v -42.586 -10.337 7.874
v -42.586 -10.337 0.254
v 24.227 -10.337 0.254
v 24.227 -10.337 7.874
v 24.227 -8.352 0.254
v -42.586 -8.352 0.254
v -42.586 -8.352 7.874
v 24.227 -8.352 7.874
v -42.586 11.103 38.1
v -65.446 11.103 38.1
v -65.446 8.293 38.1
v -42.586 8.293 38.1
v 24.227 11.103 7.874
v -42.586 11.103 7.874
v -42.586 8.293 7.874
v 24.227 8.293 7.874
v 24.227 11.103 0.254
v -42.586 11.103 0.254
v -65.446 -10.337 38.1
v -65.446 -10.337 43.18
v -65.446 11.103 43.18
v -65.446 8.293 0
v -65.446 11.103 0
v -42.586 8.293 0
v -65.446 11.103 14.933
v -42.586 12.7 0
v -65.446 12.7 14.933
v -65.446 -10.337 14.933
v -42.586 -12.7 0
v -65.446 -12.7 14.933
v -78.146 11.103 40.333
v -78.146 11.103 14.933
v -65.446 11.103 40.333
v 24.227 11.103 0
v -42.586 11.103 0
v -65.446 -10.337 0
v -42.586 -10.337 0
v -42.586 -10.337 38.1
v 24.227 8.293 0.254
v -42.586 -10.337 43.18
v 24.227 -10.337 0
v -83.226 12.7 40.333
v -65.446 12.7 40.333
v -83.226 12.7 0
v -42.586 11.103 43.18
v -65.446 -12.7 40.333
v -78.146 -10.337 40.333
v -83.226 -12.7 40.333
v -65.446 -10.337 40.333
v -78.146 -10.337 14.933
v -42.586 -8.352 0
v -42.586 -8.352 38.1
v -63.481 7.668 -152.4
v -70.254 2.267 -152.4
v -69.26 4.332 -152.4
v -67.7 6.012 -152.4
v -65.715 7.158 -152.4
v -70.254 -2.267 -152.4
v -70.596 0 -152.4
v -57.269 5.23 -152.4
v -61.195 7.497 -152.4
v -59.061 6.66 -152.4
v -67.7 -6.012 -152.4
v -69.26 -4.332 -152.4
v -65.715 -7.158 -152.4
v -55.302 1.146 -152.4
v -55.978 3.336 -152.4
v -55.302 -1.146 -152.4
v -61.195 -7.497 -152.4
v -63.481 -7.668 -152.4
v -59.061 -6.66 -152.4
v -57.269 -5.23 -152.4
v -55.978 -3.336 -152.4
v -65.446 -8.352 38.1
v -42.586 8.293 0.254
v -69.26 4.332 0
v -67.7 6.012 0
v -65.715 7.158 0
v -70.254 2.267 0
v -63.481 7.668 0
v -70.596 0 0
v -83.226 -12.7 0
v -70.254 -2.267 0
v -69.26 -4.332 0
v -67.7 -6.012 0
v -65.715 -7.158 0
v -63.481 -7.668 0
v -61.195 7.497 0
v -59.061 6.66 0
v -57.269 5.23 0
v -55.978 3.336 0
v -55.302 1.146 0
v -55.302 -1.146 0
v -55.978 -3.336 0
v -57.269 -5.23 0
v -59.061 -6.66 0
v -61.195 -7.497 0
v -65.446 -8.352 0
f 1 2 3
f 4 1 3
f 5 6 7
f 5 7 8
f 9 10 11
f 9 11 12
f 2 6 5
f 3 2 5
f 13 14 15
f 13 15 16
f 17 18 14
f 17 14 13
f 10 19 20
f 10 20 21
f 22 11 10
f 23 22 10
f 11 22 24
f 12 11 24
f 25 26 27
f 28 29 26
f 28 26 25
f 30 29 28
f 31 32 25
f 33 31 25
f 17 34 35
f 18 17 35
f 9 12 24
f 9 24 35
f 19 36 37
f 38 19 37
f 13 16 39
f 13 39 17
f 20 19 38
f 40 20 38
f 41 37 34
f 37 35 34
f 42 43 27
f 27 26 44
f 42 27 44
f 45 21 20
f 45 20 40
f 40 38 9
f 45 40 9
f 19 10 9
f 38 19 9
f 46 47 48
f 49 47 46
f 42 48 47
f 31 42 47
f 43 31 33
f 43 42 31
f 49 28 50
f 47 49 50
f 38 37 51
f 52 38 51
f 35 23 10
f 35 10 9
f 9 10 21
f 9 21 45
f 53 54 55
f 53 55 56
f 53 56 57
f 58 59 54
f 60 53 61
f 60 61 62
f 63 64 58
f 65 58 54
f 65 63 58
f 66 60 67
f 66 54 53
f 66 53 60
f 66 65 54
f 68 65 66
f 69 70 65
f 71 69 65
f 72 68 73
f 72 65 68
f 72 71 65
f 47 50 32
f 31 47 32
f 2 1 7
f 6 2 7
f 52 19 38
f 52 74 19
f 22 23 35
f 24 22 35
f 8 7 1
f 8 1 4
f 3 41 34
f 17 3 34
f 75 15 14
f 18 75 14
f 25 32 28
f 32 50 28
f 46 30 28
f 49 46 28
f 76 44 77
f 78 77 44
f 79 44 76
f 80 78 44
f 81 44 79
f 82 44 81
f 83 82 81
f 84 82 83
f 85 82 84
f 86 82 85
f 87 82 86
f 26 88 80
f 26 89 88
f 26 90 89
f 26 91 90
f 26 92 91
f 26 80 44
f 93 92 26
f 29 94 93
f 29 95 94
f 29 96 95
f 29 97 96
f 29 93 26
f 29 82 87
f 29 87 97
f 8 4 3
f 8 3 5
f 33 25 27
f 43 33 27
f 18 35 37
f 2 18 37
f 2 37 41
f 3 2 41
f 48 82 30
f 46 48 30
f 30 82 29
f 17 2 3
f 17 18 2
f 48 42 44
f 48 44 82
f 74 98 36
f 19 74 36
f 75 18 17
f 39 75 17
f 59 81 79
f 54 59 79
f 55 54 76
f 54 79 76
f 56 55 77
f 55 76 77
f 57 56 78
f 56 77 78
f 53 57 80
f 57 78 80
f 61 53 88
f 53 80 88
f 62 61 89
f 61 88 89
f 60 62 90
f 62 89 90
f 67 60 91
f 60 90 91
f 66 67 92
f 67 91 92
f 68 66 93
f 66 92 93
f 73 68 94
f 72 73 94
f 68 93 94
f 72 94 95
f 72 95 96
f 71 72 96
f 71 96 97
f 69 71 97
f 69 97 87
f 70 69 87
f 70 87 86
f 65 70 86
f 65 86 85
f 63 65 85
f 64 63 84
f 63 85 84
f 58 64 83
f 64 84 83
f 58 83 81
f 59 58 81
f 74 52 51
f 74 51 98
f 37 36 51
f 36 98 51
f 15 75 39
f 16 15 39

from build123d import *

# Parameters (mm, degrees)
F1_DEPTH  = 12.7
F2_W      = 17.78
F2_H      = 14.932741411
F3_DEPTH  = 12.7
F5_DEPTH  = 25.4
F7_DEPTH  = 0.254
F6_W      = 22.8599980474
F6_H      = 2.8099045157
F8_DEPTH  = 38.1
F9_W      = 22.8599980474
F9_H      = 21.4400039986
F10_DEPTH = 5.08
F11_W     = 66.8126046658
F11_H     = 1.9855666906
F12_DEPTH = 7.62
F11_H_2   = 2.8099045157
F14_DEPTH = 152.4


with BuildPart() as f1:
    # F0 (on Front) → F1 (new body, symmetric)
    with BuildSketch(Plane.XZ):
        Polygon((-65.4459670186, 0), (-42.5859689713, 0), (-65.4459670186, 14.932741411), align=None)
    extrude(amount=F1_DEPTH, both=True)

    # F2 (on Front) → F3 (join, symmetric)
    with BuildSketch(Plane.XZ):
        with Locations((-74.3359670186, 7.4663707055)):
            Rectangle(F2_W, F2_H)
    extrude(amount=F3_DEPTH, both=True)

    # F4 (on face) → F5 (join)
    with BuildSketch(Plane.XY.offset(14.932741411)):
        Polygon((-83.2259670186, -12.7), (-65.4459670186, -12.7), (-65.4459670186, -10.3371050209), (-78.1459670186, -10.3371050209), (-78.1459670186, 11.1028989777), (-65.4459670186, 11.1028989777), (-65.4459670186, 12.7), (-83.2259670186, 12.7), align=None)
    extrude(amount=F5_DEPTH)

    # F13 (on face) → F14 (join)
    with BuildSketch(Plane(origin=(0, 0, 0), x_dir=(1, 0, 0), z_dir=(0, 0, -1))):
        with BuildLine():
            ThreePointArc((-55.2162287311, 0), (-62.9059679949, 7.6897392638), (-70.5957072587, 0))
            Line((-70.5957072587, 0), (-55.2162287311, 0))
        make_face()
        with BuildLine():
            Line((-55.2162287311, 0), (-70.5957072587, 0))
            ThreePointArc((-70.5957072587, 0), (-62.9059679949, -7.6897392638), (-55.2162287311, 0))
        make_face()
    extrude(amount=F14_DEPTH)


with BuildPart() as f7:
    # F6 (on Top) → F7 (new body)
    with BuildSketch(Plane.XY):
        Polygon((-42.5859689713, -8.3515383303), (-42.5859689713, -10.3371050209), (24.2266356945, -10.3371050209), (24.2266356945, 11.1028989777), (-42.5859689713, 11.1028989777), (-42.5859689713, 8.292994462), align=None)
    extrude(amount=F7_DEPTH)


with BuildPart() as f8:
    # F6 (on Top) → F8 (new body)
    with BuildSketch(Plane.XY):
        with Locations((-54.0159679949, 9.6979467198)):
            Rectangle(F6_W, F6_H)
    extrude(amount=F8_DEPTH)


with BuildPart() as f8b:
    # F6 (on Top) → F8, piece 2 (new body)
    with BuildSketch(Plane.XY):
        Polygon((-65.4459670186, -10.3371050209), (-42.5859689713, -10.3371050209), (-42.5859689713, -8.3515383303), (-62.3576827347, -8.3515383303), (-65.4459670186, -8.3515383303), align=None)
    extrude(amount=F8_DEPTH)


with BuildPart() as f10:
    # F9 (on face) → F10 (new body)
    with BuildSketch(Plane.XY.offset(38.1)):
        with Locations((-54.0159679949, 0.3828969784)):
            Rectangle(F9_W, F9_H)
    extrude(amount=F10_DEPTH)


with BuildPart() as f12:
    # F11 (on face) → F12 (new body)
    with BuildSketch(Plane.XY.offset(0.254)):
        with Locations((-9.1796666384, -9.3443216756)):
            Rectangle(F11_W, F11_H)
    extrude(amount=F12_DEPTH)


with BuildPart() as f12b:
    # F11 (on face) → F12, piece 2 (new body)
    with BuildSketch(Plane.XY.offset(0.254)):
        with Locations((-9.1796666384, 9.6979467198)):
            Rectangle(F11_W, F11_H_2)
    extrude(amount=F12_DEPTH)


solid = Compound([f1.part, f7.part, f8.part, f8b.part, f10.part, f12.part, f12b.part])
